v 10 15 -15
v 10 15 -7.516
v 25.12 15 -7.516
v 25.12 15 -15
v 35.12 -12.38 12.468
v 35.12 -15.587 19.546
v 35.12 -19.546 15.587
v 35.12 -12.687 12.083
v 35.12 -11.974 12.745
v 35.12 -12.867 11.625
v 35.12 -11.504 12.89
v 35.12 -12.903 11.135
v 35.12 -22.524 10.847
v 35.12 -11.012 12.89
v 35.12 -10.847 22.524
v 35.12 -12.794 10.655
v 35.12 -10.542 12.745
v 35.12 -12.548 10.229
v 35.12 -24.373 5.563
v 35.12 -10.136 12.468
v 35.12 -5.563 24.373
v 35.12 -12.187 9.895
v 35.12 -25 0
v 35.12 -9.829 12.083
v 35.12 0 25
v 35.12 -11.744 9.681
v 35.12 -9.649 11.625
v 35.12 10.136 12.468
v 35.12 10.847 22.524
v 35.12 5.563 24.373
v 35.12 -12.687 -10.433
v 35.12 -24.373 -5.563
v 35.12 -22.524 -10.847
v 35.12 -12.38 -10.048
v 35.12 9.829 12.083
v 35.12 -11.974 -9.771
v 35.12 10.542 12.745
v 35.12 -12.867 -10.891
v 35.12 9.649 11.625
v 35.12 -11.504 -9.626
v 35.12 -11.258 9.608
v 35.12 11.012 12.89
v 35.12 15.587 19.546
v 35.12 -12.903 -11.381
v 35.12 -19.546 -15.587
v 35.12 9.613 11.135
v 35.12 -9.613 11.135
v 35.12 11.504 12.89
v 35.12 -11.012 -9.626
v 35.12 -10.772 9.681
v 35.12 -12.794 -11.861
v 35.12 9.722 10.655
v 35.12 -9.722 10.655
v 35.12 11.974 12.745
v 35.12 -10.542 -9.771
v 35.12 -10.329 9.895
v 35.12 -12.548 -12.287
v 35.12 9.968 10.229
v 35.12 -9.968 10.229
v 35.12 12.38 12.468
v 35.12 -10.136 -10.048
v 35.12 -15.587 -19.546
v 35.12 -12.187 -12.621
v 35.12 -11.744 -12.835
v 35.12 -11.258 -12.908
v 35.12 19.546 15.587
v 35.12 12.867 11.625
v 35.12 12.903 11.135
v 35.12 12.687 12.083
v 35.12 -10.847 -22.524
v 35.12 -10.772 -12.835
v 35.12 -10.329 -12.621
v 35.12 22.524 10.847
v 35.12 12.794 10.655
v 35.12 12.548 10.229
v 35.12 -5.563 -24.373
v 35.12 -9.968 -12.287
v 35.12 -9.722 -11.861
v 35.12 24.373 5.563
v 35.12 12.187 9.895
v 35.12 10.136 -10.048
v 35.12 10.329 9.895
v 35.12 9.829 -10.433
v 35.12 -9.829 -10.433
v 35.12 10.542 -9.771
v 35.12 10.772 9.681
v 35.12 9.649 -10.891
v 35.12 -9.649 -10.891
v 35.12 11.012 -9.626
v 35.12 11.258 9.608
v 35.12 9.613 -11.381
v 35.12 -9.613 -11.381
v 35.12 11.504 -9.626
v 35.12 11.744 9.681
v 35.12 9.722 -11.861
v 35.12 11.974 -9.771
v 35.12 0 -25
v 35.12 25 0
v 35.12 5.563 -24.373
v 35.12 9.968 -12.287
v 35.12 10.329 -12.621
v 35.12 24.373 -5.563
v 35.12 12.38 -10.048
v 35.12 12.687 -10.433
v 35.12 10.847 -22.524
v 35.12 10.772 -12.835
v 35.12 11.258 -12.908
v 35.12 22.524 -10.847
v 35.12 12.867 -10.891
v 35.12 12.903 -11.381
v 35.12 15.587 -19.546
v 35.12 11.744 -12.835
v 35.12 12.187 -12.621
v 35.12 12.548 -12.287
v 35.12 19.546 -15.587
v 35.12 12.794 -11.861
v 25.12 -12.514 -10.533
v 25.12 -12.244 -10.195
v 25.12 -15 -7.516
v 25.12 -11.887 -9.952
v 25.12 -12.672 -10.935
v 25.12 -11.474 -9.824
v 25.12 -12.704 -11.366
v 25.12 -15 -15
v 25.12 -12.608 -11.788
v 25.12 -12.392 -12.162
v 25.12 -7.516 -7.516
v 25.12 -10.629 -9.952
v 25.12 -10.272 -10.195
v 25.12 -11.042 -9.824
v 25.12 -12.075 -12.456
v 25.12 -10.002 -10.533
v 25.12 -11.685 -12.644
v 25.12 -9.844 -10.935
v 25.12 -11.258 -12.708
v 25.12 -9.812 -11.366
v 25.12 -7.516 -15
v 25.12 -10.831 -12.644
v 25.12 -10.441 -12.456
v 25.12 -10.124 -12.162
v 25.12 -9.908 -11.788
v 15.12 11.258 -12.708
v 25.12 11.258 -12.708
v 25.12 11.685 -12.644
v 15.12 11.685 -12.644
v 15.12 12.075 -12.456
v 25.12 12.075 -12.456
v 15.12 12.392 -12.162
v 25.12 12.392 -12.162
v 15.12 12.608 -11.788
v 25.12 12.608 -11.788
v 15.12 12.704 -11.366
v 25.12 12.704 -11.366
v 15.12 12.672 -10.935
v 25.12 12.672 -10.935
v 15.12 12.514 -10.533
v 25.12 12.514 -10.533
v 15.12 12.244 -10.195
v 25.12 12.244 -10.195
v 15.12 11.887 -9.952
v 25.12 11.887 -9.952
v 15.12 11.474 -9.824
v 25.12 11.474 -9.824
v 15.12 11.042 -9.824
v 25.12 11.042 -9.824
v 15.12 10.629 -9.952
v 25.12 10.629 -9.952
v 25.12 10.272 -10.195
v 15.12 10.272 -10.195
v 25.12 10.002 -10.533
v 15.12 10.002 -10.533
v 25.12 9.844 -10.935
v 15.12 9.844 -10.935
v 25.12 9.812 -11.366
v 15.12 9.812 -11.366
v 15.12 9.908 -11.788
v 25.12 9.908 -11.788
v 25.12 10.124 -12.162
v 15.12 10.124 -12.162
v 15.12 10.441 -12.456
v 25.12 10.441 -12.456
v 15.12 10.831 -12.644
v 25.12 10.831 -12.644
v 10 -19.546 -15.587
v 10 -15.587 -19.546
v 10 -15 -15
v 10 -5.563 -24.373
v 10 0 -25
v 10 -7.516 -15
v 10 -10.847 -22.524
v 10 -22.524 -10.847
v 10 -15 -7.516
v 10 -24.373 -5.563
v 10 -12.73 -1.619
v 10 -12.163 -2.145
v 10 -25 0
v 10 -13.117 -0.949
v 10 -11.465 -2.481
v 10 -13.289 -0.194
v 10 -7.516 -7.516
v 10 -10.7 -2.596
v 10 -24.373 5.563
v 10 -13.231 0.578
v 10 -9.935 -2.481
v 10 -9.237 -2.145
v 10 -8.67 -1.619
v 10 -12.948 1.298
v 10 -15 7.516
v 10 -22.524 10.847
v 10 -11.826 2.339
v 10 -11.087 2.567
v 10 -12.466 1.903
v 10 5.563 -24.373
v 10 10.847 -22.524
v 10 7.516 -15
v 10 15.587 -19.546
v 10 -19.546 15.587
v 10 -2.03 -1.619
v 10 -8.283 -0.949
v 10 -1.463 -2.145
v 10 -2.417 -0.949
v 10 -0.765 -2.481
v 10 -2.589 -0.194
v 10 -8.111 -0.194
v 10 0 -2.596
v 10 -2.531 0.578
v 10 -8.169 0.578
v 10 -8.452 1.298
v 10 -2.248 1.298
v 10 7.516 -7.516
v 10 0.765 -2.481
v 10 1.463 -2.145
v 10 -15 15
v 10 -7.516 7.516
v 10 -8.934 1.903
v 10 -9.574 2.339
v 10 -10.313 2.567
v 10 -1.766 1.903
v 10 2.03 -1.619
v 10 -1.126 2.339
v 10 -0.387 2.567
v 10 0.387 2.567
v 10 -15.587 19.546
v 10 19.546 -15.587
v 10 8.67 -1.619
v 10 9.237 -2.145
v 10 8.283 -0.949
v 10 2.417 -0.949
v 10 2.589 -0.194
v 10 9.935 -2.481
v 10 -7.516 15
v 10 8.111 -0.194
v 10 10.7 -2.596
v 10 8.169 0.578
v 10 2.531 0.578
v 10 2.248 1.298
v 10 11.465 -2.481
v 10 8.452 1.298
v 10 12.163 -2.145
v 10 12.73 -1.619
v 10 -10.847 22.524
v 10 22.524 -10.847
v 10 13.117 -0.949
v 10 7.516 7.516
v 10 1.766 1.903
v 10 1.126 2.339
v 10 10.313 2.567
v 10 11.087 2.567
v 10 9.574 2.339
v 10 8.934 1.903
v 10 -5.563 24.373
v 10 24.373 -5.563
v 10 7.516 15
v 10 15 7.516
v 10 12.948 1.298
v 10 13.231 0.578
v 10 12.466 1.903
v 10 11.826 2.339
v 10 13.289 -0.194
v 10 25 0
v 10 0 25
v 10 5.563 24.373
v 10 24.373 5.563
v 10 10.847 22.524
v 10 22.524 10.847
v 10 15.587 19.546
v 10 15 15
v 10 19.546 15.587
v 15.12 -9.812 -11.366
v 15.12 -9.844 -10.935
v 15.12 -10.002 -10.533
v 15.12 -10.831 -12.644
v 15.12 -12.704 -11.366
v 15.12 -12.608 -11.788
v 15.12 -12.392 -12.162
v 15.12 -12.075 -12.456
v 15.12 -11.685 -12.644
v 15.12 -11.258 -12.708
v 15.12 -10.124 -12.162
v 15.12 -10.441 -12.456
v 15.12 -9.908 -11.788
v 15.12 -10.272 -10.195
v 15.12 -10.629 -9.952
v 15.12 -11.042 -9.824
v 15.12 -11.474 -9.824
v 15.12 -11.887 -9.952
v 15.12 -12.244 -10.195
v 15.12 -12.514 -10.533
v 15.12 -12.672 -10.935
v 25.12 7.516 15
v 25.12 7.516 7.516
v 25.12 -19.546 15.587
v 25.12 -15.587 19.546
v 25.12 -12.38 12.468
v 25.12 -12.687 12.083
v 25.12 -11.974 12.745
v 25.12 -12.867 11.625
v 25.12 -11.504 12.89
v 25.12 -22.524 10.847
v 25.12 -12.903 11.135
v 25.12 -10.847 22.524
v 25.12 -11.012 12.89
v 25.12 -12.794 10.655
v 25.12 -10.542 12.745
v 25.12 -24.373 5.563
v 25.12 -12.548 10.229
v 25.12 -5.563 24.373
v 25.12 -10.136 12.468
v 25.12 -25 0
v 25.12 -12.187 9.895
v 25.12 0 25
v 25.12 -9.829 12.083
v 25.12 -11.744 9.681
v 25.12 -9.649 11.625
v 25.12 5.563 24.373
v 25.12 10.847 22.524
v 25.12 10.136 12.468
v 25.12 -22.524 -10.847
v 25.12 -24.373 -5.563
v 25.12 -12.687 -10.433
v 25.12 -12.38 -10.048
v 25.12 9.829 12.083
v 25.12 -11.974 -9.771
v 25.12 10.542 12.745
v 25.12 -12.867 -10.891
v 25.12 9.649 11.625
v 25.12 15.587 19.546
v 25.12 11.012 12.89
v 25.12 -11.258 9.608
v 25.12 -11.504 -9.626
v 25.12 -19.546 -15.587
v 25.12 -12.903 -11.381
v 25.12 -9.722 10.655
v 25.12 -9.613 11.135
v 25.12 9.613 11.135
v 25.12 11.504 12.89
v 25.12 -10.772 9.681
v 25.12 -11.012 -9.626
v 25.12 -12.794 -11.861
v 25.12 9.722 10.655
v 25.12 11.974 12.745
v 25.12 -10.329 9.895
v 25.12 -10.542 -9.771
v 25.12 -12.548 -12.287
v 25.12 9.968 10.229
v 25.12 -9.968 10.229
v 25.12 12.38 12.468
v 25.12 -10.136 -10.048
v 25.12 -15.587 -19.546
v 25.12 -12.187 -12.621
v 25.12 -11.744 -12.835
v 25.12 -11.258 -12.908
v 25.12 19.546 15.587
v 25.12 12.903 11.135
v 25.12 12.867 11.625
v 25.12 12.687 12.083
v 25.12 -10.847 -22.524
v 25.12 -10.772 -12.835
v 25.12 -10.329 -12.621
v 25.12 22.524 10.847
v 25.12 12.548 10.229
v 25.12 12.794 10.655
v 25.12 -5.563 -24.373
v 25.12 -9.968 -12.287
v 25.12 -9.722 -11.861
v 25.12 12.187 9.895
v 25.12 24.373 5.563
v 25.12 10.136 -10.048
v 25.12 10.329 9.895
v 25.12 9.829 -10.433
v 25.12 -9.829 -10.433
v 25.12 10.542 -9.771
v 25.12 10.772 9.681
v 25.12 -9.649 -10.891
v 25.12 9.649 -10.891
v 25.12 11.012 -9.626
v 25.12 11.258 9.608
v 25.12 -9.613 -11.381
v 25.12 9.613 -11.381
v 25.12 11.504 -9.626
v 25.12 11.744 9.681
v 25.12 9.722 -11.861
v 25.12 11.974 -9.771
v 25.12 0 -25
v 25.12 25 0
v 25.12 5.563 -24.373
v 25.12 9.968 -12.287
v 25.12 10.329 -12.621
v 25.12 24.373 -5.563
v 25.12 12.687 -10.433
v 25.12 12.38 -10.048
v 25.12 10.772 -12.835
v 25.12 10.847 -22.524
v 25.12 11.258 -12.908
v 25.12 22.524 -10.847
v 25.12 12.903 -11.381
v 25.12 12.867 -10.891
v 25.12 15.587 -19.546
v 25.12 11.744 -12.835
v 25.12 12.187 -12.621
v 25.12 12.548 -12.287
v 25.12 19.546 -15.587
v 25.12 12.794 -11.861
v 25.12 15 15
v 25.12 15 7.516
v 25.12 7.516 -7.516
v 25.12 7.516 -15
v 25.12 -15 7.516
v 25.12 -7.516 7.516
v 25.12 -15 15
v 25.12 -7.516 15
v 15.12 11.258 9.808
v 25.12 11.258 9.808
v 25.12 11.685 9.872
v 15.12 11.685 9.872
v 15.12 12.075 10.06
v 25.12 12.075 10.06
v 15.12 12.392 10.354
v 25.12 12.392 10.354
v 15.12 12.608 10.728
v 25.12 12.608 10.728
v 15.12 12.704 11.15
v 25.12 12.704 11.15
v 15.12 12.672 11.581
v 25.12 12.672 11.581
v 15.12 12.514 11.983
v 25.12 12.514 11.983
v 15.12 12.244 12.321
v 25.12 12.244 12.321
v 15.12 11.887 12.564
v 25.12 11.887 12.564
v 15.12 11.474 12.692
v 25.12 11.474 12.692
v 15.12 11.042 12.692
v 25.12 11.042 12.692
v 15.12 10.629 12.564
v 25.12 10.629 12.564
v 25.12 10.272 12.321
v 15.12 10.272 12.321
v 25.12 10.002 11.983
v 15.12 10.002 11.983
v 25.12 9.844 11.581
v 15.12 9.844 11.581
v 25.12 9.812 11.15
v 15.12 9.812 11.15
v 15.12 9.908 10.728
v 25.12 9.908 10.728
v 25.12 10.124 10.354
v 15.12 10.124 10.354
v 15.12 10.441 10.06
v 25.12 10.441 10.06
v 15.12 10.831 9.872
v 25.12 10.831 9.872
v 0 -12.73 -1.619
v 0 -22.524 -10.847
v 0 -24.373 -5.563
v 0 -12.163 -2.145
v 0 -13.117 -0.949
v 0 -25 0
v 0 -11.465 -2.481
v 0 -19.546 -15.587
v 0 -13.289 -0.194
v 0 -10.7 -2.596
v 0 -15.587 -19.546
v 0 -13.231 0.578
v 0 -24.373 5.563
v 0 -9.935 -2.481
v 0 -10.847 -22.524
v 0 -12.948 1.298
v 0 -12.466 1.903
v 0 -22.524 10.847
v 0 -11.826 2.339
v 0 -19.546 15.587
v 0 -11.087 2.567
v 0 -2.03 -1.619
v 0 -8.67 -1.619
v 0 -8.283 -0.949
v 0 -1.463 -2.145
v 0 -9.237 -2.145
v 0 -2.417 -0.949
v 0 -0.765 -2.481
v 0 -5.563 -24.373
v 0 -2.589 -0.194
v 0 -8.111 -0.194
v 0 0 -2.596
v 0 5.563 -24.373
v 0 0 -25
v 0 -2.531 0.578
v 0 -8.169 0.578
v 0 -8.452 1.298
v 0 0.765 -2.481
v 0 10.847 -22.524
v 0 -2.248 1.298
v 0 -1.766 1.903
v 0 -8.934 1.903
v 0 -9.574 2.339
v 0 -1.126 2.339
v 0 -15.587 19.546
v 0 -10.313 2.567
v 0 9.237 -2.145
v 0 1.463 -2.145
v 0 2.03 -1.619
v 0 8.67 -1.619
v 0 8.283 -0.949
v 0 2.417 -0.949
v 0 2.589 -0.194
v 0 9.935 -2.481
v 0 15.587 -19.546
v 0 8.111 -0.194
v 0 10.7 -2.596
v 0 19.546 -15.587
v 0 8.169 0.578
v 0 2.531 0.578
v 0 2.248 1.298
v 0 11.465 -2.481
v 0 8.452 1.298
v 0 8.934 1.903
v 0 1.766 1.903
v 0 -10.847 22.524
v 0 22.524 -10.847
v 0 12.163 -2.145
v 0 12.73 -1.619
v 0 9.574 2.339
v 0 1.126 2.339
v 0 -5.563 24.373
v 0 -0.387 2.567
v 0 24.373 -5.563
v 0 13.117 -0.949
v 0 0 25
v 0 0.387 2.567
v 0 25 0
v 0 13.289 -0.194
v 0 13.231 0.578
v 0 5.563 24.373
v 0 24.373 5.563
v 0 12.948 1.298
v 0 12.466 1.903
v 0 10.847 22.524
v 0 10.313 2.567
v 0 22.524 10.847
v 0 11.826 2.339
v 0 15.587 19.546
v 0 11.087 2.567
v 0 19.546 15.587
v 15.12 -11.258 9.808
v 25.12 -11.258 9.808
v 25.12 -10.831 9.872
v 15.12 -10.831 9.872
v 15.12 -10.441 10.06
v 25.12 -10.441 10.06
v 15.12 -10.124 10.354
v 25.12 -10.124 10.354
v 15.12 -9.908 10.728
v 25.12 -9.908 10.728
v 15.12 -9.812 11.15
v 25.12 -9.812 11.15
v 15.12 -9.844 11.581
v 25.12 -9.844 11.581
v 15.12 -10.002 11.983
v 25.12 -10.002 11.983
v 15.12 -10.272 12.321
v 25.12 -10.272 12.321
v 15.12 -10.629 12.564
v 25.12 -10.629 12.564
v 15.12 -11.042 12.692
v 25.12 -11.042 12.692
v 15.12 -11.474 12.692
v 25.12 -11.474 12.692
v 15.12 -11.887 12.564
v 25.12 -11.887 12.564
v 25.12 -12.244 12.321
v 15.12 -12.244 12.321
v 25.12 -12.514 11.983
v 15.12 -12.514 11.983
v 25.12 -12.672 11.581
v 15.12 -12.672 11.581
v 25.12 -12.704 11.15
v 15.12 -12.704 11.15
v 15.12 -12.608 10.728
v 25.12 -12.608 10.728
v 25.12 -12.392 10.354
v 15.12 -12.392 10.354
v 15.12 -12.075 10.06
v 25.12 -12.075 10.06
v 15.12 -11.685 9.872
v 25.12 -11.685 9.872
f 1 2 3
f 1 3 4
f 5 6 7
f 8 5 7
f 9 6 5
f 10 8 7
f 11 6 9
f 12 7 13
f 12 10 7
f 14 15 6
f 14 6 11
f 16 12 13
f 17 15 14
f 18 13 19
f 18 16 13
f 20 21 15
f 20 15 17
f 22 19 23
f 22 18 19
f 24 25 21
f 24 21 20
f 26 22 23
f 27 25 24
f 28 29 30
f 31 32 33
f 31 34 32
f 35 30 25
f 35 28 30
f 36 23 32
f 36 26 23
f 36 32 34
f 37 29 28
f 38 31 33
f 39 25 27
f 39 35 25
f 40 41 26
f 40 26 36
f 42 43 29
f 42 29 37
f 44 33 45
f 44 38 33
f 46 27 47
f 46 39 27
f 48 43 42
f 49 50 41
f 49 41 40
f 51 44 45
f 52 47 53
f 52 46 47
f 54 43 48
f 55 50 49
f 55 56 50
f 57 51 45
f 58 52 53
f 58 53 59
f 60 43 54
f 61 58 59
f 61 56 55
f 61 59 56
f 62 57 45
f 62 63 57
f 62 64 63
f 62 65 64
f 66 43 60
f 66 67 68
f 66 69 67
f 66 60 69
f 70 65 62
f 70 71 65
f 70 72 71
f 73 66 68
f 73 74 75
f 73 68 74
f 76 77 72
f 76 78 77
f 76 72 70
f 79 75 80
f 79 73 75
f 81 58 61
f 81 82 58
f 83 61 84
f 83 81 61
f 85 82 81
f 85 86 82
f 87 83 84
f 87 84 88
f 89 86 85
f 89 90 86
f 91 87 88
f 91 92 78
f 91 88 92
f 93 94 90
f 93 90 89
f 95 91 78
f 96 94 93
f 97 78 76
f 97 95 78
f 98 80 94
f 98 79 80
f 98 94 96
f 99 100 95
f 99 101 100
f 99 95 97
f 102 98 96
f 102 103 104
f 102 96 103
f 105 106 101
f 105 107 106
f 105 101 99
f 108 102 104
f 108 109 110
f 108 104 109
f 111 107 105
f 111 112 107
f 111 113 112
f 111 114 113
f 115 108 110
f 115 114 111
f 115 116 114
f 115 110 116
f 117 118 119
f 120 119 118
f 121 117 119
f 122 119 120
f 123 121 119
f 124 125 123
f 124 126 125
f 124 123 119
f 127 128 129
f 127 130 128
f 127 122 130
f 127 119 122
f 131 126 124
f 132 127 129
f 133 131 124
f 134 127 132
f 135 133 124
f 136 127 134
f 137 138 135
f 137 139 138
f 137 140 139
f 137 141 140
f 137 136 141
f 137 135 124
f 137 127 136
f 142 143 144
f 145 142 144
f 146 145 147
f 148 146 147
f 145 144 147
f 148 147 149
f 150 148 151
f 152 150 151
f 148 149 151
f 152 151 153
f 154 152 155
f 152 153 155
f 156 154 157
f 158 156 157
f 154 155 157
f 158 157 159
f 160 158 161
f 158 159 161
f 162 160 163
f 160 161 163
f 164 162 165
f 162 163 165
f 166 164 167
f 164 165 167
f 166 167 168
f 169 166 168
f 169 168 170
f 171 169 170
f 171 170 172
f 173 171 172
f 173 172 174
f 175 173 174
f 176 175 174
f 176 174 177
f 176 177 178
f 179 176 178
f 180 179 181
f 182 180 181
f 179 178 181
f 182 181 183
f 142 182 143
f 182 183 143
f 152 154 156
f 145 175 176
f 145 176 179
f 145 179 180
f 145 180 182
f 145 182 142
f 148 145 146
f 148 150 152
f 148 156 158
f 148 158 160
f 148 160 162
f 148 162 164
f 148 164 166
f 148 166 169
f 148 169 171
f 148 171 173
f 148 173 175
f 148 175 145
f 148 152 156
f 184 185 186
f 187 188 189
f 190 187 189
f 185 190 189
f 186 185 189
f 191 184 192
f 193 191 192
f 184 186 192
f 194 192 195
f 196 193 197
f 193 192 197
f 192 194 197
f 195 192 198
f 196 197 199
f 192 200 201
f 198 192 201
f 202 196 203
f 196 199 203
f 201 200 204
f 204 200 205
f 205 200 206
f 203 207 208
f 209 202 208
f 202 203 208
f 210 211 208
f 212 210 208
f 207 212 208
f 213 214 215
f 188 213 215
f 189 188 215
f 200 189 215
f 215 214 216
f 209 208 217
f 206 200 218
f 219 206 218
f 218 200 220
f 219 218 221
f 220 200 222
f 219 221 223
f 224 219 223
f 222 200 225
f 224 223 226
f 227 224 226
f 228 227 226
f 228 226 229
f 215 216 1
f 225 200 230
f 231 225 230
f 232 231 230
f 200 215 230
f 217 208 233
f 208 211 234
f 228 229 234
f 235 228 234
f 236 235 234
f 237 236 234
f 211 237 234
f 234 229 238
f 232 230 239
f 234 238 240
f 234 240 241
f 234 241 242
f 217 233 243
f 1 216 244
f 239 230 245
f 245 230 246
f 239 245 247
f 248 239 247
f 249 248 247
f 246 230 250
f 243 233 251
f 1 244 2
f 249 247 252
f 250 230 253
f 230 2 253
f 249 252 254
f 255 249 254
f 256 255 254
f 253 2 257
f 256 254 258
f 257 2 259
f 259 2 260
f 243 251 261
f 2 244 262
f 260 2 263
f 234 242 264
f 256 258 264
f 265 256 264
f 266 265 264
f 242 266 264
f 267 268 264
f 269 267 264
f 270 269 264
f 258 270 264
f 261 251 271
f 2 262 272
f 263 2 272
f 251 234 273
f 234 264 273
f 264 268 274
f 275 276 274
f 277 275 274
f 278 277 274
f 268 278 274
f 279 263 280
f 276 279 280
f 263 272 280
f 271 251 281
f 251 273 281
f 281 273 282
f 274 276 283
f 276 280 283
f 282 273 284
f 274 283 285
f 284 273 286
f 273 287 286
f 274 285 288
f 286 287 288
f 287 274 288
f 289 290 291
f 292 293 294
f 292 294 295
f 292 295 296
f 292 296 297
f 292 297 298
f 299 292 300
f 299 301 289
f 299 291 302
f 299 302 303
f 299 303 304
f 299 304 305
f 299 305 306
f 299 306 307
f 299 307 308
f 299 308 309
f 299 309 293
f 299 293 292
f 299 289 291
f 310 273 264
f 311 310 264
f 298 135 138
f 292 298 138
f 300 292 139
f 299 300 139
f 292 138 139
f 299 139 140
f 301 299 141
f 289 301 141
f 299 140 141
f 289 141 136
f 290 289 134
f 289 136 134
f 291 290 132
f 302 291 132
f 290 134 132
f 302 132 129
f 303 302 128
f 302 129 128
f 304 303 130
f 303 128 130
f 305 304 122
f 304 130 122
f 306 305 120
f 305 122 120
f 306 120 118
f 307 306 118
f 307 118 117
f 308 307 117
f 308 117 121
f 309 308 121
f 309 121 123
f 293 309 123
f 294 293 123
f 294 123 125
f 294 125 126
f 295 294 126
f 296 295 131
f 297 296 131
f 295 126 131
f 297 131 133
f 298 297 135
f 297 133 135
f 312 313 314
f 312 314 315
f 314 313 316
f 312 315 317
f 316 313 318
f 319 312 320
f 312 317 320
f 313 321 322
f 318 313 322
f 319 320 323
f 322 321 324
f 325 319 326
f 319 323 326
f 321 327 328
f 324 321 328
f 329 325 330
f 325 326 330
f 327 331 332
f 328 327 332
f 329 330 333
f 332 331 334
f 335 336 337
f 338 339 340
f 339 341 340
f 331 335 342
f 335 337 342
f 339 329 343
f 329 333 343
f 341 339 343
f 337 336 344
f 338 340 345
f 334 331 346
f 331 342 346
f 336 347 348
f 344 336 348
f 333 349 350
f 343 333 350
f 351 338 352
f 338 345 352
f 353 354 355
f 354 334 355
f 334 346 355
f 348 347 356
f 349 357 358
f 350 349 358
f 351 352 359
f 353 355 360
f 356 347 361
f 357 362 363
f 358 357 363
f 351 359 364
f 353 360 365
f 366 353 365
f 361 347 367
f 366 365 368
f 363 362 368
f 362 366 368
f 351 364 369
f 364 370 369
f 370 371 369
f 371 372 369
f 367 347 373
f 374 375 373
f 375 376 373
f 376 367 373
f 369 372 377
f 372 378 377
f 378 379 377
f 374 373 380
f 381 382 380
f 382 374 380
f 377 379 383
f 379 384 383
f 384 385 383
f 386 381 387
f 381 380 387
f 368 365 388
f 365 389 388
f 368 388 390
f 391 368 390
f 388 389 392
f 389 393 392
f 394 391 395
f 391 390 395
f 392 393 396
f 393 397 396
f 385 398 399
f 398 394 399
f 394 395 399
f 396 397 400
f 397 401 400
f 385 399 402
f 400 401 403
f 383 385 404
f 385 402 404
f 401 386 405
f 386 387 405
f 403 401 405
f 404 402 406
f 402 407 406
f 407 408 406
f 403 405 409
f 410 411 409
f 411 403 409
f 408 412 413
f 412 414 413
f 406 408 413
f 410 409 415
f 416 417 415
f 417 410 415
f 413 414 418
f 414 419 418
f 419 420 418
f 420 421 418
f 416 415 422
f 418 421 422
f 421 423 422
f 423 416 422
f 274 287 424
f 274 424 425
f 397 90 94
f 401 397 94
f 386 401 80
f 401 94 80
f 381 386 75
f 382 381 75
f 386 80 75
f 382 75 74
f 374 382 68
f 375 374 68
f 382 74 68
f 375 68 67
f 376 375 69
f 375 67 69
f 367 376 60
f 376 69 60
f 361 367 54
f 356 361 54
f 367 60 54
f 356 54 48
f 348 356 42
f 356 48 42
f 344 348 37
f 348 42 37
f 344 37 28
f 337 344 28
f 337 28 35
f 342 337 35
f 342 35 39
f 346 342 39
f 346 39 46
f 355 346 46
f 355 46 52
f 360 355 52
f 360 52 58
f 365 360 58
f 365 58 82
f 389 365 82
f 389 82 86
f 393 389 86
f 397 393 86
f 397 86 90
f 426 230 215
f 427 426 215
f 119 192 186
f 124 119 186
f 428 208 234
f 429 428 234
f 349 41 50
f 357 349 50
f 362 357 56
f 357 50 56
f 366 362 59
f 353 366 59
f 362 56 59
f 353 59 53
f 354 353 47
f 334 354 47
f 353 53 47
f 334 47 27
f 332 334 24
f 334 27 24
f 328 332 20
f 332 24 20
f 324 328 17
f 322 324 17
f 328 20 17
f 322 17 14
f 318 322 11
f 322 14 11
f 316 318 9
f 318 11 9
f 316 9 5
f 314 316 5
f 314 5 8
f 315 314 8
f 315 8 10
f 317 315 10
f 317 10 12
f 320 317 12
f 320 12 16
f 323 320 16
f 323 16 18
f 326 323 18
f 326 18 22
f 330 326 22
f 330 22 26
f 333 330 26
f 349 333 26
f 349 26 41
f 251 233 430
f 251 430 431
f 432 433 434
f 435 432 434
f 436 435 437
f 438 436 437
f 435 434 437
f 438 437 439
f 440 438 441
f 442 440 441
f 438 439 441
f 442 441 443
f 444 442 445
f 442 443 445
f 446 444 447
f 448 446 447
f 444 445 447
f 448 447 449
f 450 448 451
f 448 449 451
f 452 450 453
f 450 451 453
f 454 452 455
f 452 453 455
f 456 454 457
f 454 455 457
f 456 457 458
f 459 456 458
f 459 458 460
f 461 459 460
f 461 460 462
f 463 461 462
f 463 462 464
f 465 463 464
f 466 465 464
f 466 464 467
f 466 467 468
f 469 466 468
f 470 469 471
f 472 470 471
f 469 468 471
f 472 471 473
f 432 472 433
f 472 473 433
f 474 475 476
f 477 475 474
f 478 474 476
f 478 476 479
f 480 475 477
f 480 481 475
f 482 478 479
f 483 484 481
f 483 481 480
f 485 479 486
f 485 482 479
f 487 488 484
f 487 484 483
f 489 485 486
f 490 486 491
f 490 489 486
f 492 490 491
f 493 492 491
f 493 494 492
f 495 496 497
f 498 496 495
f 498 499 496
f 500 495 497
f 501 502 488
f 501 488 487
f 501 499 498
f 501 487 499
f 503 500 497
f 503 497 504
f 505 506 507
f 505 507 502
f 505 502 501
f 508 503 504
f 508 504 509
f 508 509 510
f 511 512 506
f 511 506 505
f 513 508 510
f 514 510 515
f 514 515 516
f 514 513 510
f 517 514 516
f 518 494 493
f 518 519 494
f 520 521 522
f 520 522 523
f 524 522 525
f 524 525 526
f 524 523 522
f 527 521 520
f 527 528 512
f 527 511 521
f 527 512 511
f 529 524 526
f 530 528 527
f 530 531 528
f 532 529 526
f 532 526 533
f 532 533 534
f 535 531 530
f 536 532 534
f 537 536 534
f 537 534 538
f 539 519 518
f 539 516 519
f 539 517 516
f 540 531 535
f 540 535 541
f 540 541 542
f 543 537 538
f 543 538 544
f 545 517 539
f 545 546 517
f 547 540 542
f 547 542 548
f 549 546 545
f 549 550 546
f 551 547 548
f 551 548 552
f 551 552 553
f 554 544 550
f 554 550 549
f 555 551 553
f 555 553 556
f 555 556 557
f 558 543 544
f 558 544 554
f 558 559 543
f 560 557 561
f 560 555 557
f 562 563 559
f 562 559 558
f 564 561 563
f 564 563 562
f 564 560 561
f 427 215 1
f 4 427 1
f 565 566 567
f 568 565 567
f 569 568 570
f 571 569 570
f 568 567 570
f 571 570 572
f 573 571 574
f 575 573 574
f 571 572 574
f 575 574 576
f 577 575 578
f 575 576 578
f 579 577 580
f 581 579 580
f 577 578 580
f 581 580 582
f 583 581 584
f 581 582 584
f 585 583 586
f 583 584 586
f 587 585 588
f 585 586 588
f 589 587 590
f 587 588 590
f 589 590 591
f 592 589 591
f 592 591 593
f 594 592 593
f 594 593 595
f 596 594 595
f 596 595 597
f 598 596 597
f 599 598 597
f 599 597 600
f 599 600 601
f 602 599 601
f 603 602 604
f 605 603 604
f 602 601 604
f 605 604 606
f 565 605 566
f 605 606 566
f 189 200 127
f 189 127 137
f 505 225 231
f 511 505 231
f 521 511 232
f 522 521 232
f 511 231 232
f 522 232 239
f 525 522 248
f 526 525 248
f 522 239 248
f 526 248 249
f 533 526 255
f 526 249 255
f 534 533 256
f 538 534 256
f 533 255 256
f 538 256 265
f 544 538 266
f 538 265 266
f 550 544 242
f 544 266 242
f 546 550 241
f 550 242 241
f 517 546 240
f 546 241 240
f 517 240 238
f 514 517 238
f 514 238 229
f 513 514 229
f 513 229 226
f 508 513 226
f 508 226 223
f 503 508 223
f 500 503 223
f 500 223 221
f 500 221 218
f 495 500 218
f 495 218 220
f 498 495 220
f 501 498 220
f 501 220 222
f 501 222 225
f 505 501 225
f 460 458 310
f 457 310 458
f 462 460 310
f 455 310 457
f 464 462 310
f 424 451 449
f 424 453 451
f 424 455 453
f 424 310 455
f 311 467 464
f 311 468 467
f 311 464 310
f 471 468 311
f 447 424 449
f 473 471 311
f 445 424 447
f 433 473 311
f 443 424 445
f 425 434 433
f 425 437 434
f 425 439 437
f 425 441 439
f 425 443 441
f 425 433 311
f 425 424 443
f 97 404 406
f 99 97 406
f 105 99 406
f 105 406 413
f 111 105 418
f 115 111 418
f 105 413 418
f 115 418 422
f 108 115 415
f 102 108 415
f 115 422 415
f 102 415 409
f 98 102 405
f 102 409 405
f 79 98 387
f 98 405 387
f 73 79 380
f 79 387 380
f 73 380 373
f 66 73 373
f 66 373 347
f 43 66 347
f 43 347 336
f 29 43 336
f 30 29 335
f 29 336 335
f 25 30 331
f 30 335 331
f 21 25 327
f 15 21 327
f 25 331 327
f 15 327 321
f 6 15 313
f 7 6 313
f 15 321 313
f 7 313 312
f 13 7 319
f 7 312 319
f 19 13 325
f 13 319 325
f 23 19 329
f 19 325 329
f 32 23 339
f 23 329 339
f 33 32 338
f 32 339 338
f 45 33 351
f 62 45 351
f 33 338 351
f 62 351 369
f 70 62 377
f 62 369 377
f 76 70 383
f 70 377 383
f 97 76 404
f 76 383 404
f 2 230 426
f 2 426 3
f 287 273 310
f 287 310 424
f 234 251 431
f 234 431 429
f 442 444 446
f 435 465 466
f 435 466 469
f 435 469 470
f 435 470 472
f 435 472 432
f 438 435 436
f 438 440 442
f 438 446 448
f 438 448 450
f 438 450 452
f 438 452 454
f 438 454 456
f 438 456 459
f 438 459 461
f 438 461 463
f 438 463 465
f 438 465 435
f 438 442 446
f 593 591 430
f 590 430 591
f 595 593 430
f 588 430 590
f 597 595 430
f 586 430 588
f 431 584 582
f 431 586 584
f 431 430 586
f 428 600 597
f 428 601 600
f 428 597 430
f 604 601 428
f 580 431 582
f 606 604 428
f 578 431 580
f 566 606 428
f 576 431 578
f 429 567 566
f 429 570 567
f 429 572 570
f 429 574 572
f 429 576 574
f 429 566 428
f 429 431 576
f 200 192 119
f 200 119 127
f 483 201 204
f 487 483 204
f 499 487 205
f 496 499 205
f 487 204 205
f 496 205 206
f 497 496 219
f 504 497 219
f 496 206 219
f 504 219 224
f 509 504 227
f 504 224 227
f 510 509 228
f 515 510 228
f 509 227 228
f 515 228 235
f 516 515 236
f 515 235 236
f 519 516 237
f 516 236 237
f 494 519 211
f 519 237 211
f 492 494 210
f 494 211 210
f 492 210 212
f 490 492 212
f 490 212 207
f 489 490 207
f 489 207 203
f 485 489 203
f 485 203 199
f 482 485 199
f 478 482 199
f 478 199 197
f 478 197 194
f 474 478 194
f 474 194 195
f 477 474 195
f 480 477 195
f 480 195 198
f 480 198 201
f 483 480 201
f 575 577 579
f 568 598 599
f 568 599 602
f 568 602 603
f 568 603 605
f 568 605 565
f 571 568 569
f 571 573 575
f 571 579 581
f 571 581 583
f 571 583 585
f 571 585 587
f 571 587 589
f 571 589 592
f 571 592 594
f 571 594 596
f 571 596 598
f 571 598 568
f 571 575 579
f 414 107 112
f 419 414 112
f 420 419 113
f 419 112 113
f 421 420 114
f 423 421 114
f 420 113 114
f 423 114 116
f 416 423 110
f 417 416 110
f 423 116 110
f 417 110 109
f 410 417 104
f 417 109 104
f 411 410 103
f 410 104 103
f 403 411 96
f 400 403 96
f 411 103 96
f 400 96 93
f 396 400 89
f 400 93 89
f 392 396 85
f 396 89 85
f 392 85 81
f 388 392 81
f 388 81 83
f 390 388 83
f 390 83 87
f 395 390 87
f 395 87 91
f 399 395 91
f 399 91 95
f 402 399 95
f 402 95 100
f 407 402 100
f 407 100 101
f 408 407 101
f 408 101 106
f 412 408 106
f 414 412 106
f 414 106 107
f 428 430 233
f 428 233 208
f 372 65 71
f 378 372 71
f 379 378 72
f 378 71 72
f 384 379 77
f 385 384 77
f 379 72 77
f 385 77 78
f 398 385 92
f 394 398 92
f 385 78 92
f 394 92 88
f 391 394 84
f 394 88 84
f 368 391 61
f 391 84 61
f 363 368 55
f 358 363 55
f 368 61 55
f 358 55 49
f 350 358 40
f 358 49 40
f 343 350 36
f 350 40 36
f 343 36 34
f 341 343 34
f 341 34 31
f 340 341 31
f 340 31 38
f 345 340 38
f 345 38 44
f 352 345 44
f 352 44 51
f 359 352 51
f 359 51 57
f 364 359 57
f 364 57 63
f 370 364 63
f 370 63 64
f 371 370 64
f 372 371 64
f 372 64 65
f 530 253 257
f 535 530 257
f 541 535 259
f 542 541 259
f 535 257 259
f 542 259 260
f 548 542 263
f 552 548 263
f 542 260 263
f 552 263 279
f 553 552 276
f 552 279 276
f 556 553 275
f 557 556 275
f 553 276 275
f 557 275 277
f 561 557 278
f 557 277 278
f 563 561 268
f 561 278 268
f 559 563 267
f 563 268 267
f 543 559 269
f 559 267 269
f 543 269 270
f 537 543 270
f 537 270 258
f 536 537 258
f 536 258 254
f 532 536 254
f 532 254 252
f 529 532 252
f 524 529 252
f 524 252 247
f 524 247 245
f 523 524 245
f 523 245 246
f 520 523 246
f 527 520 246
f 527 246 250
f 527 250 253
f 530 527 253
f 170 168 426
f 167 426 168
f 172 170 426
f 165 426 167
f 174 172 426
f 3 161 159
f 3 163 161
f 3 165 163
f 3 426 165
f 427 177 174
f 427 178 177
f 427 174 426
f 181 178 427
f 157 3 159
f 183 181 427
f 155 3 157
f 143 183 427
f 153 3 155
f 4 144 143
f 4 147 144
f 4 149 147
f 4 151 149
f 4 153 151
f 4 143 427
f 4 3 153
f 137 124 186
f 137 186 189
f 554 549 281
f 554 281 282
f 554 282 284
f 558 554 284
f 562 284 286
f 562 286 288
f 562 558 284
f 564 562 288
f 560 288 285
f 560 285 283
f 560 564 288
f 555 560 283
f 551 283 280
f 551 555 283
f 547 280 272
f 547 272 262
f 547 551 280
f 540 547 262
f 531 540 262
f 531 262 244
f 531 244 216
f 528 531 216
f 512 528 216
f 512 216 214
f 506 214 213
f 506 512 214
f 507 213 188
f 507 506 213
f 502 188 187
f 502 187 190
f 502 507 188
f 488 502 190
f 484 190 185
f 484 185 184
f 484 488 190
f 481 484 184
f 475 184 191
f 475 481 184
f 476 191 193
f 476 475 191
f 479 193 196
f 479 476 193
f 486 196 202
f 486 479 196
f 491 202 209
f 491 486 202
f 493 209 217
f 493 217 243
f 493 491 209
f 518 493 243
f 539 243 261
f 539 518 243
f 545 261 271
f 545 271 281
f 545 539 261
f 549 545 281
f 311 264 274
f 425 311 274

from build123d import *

# Parameters (mm, degrees)
SKETCH1_W           = 30
SKETCH1_H           = 30
BOSS_EXTRUDE1_DEPTH = 10
SKETCH2_W           = 7.484
SKETCH2_H           = 7.484
BOSS_EXTRUDE2_DEPTH = 15.12
SKETCH3_R           = 2.596307875
CUT_EXTRUDE1_DEPTH  = 27.050228406
SKETCH4_R           = 25
SKETCH4_W           = 30
SKETCH4_H           = 30
BOSS_EXTRUDE4_DEPTH = 10
SKETCH5_R           = 25
BOSS_EXTRUDE5_DEPTH = 10
SKETCH6_R           = 1.45
CUT_EXTRUDE2_DEPTH  = 10
SKETCH7_R           = 1.65
CUT_EXTRUDE3_DEPTH  = 50.833868002
SKETCH8_R           = 1.45
CUT_EXTRUDE4_DEPTH  = 10


with BuildPart() as part:
    # Sketch1 → Boss-Extrude1 (new body)
    with BuildSketch(Plane(origin=(0, 0, 0), x_dir=(0, 0, -1), z_dir=(1, 0, 0))):
        Rectangle(SKETCH1_W, SKETCH1_H)
    extrude(amount=BOSS_EXTRUDE1_DEPTH)

    # Sketch2 → Boss-Extrude2 (add)
    with BuildSketch(Plane(origin=(10, 0, 0), x_dir=(0, 0, -1), z_dir=(1, 0, 0))):
        with Locations((-11.258, 11.258)):
            Rectangle(SKETCH2_W, SKETCH2_H)
        with Locations((11.258, 11.258)):
            Rectangle(SKETCH2_W, SKETCH2_H)
        with Locations((11.258, -11.258)):
            Rectangle(SKETCH2_W, SKETCH2_H)
        with Locations((-11.258, -11.258)):
            Rectangle(SKETCH2_W, SKETCH2_H)
    extrude(amount=BOSS_EXTRUDE2_DEPTH)

    # Sketch3 → Cut-Extrude1 (cut, through all)
    with BuildSketch(Plane(origin=(10, 0, 0), x_dir=(0, 0, -1), z_dir=(1, 0, 0))):
        with Locations((0, 10.7)):
            Circle(SKETCH3_R)
        with Locations((0, -10.7)):
            Circle(SKETCH3_R)
        Circle(SKETCH3_R)
    extrude(amount=-CUT_EXTRUDE1_DEPTH, mode=Mode.SUBTRACT)

    # Sketch4 → Boss-Extrude4 (add)
    with BuildSketch(Plane.ZY):
        Circle(SKETCH4_R)
        Rectangle(SKETCH4_W, SKETCH4_H, mode=Mode.SUBTRACT)
    extrude(amount=-BOSS_EXTRUDE4_DEPTH)

    # Sketch8 → Cut-Extrude4 (cut)
    with BuildSketch(Plane(origin=(25.12, 0, 0), x_dir=(0, 0, -1), z_dir=(1, 0, 0))):
        with Locations((-11.258, 11.258)):
            Circle(SKETCH8_R)
        with Locations((-11.258, -11.258)):
            Circle(SKETCH8_R)
        with Locations((11.258, 11.258)):
            Circle(SKETCH8_R)
        with Locations((11.258, -11.258)):
            Circle(SKETCH8_R)
    extrude(amount=-CUT_EXTRUDE4_DEPTH, mode=Mode.SUBTRACT)


with BuildPart() as body_2:
    # Sketch5 → Boss-Extrude5 (new body)
    with BuildSketch(Plane(origin=(25.12, 0, 0), x_dir=(0, 0, -1), z_dir=(1, 0, 0))):
        Circle(SKETCH5_R)
    extrude(amount=BOSS_EXTRUDE5_DEPTH)

    # Sketch6 → Cut-Extrude2 (cut)
    with BuildSketch(Plane(origin=(35.12, 0, 0), x_dir=(0, 0, -1), z_dir=(1, 0, 0))):
        with Locations((-11.258, 11.258)):
            Circle(SKETCH6_R)
        with Locations((-11.258, -11.258)):
            Circle(SKETCH6_R)
        with Locations((11.258, -11.258)):
            Circle(SKETCH6_R)
        with Locations((11.258, 11.258)):
            Circle(SKETCH6_R)
    extrude(amount=-CUT_EXTRUDE2_DEPTH, mode=Mode.SUBTRACT)

    # Sketch7 → Cut-Extrude3 (cut, through all)
    with BuildSketch(Plane(origin=(35.12, 0, 0), x_dir=(0, 0, -1), z_dir=(1, 0, 0))):
        with Locations((11.258, -11.258)):
            Circle(SKETCH7_R)
        with Locations((-11.258, 11.258)):
            Circle(SKETCH7_R)
        with Locations((-11.258, -11.258)):
            Circle(SKETCH7_R)
        with Locations((11.258, 11.258)):
            Circle(SKETCH7_R)
    extrude(amount=-CUT_EXTRUDE3_DEPTH, mode=Mode.SUBTRACT)


solid = Compound([part.part, body_2.part])
